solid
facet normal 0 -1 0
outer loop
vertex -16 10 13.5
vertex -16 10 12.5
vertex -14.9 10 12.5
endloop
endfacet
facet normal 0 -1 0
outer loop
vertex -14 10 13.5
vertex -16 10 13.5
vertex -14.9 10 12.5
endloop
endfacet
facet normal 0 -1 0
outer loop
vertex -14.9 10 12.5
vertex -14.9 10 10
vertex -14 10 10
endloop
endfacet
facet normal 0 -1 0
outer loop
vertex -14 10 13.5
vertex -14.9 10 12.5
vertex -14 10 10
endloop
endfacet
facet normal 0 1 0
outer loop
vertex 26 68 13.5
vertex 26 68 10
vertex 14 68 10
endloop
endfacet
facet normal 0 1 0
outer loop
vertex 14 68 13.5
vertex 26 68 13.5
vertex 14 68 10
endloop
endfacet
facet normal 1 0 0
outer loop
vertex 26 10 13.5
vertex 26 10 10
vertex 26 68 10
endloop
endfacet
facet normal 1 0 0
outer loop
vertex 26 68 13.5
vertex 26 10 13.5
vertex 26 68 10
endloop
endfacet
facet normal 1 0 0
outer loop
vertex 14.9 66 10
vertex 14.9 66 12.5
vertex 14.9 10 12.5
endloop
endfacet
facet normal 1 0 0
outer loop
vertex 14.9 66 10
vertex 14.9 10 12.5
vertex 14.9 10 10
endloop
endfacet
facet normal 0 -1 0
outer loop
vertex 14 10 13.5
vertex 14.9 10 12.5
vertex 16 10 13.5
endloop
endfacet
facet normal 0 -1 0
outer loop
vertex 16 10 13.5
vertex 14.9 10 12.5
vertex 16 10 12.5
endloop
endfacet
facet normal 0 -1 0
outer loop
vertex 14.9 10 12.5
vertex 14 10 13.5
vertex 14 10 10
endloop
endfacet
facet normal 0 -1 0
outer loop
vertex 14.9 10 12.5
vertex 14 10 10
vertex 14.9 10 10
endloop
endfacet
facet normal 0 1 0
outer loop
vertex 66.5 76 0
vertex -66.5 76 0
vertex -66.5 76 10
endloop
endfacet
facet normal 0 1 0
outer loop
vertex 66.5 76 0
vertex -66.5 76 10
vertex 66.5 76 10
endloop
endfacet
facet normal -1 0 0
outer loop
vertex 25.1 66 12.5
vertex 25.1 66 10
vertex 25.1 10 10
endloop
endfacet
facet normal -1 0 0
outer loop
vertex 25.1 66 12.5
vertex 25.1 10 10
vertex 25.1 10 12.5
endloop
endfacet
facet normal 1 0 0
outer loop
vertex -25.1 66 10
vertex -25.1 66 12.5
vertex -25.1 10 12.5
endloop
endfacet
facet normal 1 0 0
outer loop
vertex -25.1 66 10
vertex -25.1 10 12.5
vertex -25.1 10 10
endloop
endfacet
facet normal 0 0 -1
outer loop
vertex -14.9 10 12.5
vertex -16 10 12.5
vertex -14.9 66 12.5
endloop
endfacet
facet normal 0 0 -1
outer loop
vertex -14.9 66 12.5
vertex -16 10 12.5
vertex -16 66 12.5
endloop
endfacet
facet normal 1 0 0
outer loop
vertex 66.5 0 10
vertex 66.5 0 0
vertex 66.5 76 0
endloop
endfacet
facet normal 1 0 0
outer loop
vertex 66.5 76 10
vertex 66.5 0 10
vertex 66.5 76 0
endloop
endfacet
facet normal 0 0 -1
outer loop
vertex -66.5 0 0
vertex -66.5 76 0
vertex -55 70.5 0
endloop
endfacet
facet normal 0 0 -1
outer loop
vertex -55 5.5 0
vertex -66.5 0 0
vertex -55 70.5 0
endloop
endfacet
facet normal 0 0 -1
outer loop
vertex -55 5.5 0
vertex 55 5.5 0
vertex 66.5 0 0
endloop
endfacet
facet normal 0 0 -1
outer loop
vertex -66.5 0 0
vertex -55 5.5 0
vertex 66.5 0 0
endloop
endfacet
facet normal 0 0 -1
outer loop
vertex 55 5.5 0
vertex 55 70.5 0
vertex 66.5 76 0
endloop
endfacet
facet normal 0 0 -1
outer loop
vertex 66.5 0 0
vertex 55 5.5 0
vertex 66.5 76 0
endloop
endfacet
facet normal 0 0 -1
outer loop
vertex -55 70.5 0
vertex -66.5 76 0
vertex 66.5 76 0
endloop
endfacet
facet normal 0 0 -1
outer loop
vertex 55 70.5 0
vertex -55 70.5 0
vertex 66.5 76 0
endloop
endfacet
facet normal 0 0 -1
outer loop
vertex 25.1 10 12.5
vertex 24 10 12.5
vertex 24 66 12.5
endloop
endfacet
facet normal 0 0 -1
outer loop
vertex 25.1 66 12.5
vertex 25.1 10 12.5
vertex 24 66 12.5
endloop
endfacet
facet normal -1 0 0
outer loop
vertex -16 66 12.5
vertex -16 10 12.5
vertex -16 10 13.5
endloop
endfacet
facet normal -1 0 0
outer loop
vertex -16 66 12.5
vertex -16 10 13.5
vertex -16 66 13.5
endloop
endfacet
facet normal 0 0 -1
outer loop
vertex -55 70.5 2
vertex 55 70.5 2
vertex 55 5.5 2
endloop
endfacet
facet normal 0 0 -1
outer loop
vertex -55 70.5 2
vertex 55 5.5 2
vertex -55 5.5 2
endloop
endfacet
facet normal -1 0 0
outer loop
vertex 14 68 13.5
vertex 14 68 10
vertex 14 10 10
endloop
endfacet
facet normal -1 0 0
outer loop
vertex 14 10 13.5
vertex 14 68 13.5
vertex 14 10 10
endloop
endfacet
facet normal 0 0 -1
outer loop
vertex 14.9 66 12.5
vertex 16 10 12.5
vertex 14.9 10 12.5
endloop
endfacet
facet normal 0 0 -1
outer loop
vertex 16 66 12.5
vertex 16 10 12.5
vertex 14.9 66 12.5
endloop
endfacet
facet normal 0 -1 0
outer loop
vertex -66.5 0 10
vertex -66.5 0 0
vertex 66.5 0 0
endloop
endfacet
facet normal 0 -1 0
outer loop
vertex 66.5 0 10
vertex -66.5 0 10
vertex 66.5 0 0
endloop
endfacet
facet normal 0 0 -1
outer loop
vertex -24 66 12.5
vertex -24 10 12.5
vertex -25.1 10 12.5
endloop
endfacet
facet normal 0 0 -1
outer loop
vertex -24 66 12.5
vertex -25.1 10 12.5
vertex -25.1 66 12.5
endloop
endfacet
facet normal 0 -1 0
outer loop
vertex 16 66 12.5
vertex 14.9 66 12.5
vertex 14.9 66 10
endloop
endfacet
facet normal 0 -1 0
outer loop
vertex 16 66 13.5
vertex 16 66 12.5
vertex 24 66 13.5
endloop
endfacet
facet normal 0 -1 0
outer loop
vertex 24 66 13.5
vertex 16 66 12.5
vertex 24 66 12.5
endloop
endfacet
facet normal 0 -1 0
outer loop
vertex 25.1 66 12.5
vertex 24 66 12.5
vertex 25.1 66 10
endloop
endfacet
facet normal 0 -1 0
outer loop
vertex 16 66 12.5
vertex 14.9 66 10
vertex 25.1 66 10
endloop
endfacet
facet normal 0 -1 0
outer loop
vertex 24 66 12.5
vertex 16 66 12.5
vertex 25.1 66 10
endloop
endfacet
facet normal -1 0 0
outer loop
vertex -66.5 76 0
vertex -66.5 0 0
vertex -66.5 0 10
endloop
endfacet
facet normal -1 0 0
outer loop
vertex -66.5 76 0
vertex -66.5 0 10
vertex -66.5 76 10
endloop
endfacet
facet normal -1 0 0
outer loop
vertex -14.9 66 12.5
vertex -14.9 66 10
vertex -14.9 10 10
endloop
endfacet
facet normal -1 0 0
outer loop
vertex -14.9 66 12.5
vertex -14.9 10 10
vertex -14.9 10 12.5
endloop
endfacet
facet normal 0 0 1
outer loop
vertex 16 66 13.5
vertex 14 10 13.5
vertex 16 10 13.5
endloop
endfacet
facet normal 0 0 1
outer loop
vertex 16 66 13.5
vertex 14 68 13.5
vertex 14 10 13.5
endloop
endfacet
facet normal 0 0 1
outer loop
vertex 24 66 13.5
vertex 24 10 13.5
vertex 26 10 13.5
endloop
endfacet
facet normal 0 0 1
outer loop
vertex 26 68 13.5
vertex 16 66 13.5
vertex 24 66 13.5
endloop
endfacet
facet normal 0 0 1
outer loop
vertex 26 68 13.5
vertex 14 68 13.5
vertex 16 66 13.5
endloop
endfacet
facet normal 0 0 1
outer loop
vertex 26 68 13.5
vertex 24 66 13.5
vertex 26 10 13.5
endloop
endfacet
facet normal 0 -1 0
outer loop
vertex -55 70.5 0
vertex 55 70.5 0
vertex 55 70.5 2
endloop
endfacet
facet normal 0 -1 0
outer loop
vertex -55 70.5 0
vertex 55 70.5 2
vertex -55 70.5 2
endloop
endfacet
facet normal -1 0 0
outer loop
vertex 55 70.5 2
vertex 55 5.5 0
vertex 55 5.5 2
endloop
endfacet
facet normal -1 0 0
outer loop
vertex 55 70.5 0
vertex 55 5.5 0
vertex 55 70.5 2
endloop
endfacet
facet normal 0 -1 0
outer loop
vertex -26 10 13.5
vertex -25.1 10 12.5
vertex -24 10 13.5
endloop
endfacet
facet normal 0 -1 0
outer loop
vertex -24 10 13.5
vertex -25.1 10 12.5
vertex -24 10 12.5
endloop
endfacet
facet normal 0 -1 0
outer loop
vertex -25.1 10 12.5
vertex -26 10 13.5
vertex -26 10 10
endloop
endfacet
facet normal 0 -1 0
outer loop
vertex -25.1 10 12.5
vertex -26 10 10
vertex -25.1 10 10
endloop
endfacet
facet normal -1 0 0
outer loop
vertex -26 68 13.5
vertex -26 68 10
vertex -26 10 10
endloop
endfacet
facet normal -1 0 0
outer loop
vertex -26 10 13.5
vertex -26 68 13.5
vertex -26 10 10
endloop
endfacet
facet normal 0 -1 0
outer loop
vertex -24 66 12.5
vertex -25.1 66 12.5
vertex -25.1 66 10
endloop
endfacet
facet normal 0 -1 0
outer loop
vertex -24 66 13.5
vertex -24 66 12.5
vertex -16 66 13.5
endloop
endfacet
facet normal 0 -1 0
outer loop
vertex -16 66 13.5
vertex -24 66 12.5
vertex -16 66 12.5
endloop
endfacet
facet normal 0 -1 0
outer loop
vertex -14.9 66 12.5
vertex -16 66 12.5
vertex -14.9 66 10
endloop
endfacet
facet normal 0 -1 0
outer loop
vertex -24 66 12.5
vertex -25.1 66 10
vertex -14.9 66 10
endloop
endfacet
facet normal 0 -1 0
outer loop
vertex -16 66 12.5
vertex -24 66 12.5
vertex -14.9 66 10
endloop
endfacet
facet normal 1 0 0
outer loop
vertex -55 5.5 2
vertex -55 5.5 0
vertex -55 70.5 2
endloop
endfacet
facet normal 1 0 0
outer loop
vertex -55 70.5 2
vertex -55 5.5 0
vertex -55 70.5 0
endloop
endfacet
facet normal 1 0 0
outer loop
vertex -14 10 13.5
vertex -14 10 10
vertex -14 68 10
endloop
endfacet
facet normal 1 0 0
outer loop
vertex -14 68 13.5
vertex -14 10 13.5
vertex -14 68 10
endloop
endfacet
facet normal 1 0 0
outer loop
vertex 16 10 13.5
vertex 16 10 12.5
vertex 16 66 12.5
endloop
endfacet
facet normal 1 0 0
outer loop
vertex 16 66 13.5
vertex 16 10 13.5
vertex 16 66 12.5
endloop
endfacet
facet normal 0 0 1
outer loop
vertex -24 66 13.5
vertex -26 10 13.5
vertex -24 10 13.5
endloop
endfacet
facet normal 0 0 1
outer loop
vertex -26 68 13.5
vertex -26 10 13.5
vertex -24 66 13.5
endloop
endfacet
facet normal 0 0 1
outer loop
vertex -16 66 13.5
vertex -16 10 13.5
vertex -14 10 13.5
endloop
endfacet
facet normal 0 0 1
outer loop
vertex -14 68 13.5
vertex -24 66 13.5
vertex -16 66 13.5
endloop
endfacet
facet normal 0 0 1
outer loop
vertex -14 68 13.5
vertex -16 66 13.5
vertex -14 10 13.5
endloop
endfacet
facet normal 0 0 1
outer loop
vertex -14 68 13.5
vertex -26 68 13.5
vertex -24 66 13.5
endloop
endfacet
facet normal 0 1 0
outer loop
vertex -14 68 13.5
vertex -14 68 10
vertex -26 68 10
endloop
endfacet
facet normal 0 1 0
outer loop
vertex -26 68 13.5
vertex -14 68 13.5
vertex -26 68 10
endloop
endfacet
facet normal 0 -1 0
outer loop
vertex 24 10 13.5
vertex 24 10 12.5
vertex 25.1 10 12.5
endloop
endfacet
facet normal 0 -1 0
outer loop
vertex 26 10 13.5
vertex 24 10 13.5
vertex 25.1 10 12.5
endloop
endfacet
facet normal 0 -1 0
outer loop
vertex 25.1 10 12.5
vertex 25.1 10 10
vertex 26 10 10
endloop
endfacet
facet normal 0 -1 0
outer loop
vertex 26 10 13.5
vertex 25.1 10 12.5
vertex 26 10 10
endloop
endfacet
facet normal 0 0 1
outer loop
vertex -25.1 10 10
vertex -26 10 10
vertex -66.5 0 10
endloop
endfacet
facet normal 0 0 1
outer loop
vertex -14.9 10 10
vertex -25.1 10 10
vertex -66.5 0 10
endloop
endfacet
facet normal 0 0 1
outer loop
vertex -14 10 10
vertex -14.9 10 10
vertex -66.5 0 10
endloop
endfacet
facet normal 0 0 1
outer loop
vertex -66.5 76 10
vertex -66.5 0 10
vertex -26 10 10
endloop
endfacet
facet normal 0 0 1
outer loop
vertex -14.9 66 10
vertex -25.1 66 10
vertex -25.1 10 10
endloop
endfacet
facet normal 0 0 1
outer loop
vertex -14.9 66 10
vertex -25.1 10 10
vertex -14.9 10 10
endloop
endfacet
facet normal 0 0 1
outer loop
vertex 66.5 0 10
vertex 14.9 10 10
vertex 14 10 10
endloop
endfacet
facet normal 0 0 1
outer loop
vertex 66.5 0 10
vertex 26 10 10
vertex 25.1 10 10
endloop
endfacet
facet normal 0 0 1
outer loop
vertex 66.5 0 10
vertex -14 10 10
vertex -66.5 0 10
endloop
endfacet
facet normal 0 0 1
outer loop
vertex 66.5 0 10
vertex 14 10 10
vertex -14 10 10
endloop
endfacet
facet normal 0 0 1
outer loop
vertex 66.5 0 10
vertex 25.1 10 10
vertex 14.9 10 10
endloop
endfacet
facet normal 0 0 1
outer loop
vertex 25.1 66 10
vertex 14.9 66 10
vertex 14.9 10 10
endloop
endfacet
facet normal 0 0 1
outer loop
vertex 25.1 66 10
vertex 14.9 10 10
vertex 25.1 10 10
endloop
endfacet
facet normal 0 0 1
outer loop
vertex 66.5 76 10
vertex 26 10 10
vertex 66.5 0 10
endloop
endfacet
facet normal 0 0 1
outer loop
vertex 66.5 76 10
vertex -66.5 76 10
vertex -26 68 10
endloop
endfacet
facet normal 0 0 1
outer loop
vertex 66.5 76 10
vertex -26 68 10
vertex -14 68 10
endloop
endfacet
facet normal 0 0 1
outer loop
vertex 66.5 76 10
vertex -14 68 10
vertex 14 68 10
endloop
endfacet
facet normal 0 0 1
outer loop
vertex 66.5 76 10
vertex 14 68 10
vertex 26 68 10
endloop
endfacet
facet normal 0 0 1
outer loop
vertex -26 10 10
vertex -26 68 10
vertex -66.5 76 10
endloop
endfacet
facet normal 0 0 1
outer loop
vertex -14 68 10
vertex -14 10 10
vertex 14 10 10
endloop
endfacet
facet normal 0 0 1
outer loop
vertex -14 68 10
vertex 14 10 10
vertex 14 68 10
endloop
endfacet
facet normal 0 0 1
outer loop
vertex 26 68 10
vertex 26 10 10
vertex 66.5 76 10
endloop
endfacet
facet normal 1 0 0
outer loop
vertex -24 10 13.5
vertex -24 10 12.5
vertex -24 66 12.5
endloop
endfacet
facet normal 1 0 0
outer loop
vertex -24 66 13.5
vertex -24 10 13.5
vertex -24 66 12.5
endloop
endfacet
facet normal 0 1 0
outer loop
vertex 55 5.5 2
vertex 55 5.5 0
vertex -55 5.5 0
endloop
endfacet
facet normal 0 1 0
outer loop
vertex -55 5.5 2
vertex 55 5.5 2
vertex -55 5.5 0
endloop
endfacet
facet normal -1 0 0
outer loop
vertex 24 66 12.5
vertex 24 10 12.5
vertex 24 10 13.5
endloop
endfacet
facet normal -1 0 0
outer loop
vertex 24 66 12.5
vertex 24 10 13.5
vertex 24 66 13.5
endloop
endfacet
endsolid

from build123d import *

# Parameters (mm, degrees)
CROQUIS1_W              = 133
CROQUIS1_H              = 76
SALIENTE_EXTRUIR1_DEPTH = 10
CROQUIS2_W              = 110
CROQUIS2_H              = 65
CORTAR_EXTRUIR1_DEPTH   = 2
CROQUIS3_W              = 2
CROQUIS3_H              = 56
SALIENTE_EXTRUIR6_DEPTH = 3.5
CROQUIS4_W              = 2.5
CROQUIS4_H              = 56
CORTAR_EXTRUIR2_DEPTH   = 1.1
CROQUIS5_W              = 2.5
CROQUIS5_H              = 56
CORTAR_EXTRUIR3_DEPTH   = 1.1
CROQUIS6_W              = 2.5
CROQUIS6_H              = 56
CORTAR_EXTRUIR4_DEPTH   = 1.1
CROQUIS7_W              = 2.5
CROQUIS7_H              = 56
CORTAR_EXTRUIR5_DEPTH   = 1.1


with BuildPart() as part:
    # Croquis1 → Saliente-Extruir1 (new body)
    with BuildSketch(Plane.XY):
        with Locations((0, 38)):
            Rectangle(CROQUIS1_W, CROQUIS1_H)
    extrude(amount=SALIENTE_EXTRUIR1_DEPTH)

    # Croquis2 → Cortar-Extruir1 (cut)
    with BuildSketch(Plane(origin=(0, 0, 0), x_dir=(-1, 0, 0), z_dir=(0, 0, -1))):
        with Locations((0, 38)):
            Rectangle(CROQUIS2_W, CROQUIS2_H)
    extrude(amount=-CORTAR_EXTRUIR1_DEPTH, mode=Mode.SUBTRACT)

    # Croquis3 → Saliente-Extruir6 (add)
    with BuildSketch(Plane.XY.offset(10)):
        Polygon((-26, 68), (-26, 66), (-24, 66), (-16, 66), (-14, 66), (-14, 68), align=None)
        with Locations((-25, 38)):
            Rectangle(CROQUIS3_W, CROQUIS3_H)
        with Locations((-15, 38)):
            Rectangle(CROQUIS3_W, CROQUIS3_H)
        with Locations((15, 38)):
            Rectangle(CROQUIS3_W, CROQUIS3_H)
        Polygon((14, 66), (16, 66), (24, 66), (26, 66), (26, 68), (14, 68), align=None)
        with Locations((25, 38)):
            Rectangle(CROQUIS3_W, CROQUIS3_H)
    extrude(amount=SALIENTE_EXTRUIR6_DEPTH)

    # Croquis4 → Cortar-Extruir2 (cut)
    with BuildSketch(Plane(origin=(-24, 0, 0), x_dir=(0, 0, -1), z_dir=(1, 0, 0))):
        with Locations((-11.25, 38)):
            Rectangle(CROQUIS4_W, CROQUIS4_H)
    extrude(amount=-CORTAR_EXTRUIR2_DEPTH, mode=Mode.SUBTRACT)

    # Croquis5 → Cortar-Extruir3 (cut)
    with BuildSketch(Plane.ZY.offset(16)):
        with Locations((11.25, 38)):
            Rectangle(CROQUIS5_W, CROQUIS5_H)
    extrude(amount=-CORTAR_EXTRUIR3_DEPTH, mode=Mode.SUBTRACT)

    # Croquis6 → Cortar-Extruir4 (cut)
    with BuildSketch(Plane(origin=(16, 0, 0), x_dir=(0, 0, -1), z_dir=(1, 0, 0))):
        with Locations((-11.25, 38)):
            Rectangle(CROQUIS6_W, CROQUIS6_H)
    extrude(amount=-CORTAR_EXTRUIR4_DEPTH, mode=Mode.SUBTRACT)

    # Croquis7 → Cortar-Extruir5 (cut)
    with BuildSketch(Plane.ZY.offset(-24)):
        with Locations((11.25, 38)):
            Rectangle(CROQUIS7_W, CROQUIS7_H)
    extrude(amount=-CORTAR_EXTRUIR5_DEPTH, mode=Mode.SUBTRACT)


solid = part.part
